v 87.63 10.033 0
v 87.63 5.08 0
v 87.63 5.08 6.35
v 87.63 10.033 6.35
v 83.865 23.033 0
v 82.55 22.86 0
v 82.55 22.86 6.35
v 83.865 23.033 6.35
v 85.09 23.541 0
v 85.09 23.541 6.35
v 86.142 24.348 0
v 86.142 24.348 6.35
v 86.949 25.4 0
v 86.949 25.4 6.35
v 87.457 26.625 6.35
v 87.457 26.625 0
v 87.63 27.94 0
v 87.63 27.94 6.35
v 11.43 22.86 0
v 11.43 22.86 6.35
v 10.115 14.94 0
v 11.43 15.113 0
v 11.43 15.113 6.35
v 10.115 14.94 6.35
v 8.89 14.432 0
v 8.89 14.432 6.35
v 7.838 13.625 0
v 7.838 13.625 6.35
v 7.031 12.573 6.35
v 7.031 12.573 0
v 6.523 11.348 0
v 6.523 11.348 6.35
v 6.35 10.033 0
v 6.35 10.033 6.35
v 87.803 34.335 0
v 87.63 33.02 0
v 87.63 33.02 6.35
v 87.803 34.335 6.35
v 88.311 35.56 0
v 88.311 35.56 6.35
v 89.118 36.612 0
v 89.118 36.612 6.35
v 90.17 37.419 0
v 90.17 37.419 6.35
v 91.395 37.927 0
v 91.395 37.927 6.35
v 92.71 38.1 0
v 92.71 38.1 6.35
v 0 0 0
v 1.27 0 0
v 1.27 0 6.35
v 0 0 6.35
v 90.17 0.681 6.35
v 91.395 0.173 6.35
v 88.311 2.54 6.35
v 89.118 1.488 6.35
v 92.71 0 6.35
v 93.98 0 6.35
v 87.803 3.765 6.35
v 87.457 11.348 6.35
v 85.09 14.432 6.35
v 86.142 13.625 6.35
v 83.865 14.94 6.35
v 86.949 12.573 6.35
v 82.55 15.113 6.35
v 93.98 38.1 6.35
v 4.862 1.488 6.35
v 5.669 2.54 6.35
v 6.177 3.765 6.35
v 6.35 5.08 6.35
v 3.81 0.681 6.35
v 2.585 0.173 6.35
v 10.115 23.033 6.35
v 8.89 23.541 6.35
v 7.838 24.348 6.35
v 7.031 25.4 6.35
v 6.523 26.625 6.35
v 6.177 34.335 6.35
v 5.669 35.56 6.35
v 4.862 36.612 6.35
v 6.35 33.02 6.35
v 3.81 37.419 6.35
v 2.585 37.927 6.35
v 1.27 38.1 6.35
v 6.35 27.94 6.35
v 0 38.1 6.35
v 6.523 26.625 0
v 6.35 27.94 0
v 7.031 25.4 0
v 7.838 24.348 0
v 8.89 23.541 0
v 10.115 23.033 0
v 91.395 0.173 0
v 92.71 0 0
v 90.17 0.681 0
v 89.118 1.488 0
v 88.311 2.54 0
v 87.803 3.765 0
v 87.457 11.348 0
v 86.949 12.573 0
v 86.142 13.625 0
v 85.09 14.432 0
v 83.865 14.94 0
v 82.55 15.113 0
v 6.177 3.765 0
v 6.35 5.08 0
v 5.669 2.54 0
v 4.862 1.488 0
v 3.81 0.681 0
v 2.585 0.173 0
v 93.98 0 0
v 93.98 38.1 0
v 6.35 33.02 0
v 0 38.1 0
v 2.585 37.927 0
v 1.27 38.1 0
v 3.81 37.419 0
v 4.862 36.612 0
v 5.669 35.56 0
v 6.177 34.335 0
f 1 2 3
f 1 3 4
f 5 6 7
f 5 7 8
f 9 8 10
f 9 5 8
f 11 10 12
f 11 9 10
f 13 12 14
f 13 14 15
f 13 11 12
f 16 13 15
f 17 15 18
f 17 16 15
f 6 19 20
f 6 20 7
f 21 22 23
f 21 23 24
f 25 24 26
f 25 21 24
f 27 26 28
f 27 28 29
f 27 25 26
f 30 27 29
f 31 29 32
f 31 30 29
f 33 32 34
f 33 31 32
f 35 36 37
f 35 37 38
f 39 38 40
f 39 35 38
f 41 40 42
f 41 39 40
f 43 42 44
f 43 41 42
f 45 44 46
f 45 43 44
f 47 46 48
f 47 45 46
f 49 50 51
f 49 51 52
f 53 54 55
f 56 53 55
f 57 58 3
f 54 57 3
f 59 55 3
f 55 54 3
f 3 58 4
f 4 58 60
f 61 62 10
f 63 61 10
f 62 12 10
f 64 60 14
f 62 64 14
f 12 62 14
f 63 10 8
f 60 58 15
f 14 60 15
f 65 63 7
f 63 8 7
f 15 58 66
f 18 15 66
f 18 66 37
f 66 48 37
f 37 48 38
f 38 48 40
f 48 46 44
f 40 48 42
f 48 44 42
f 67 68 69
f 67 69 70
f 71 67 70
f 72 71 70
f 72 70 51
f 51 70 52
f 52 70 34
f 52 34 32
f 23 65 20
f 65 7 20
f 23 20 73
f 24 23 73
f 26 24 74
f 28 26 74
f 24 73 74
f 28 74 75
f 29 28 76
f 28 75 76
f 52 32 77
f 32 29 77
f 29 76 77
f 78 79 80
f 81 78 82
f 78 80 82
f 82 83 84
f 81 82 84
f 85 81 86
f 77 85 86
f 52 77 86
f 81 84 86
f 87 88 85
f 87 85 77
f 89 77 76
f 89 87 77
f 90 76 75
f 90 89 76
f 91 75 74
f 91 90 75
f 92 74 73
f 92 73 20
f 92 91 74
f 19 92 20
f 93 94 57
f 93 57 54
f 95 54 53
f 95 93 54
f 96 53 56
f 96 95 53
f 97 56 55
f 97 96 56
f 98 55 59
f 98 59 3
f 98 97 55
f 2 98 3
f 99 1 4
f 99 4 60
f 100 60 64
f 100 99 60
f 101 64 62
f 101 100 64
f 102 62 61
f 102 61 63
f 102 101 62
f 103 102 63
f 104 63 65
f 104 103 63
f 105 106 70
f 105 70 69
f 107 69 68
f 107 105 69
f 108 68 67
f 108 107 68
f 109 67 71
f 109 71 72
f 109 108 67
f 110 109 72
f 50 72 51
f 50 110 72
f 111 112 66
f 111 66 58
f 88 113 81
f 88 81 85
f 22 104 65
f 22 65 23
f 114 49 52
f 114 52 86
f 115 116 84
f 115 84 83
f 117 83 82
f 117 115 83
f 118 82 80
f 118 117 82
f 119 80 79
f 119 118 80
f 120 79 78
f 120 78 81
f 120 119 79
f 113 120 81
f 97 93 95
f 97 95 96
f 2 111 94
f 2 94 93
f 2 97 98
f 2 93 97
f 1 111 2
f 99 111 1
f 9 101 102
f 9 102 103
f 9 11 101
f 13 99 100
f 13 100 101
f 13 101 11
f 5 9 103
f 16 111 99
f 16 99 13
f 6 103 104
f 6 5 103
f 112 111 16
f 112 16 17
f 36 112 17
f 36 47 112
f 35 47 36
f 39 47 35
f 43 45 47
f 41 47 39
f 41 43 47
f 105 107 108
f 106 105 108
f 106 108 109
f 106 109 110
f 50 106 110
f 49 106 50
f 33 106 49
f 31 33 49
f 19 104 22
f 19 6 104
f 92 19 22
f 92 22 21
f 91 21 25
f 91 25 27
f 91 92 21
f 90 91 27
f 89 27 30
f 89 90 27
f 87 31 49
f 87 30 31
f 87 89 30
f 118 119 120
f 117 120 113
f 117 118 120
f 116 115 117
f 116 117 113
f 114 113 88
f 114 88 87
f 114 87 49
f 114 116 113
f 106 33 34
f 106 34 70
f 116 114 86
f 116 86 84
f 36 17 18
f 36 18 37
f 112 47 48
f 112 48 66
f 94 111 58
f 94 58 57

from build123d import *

# Parameters (mm, degrees)
BOSS_EXTRUDE2_DEPTH = 6.35


with BuildPart() as part:
    # Sketch3 → Boss-Extrude2 (new body)
    with BuildSketch(Plane.XY):
        with BuildLine():
            Line((0, 0), (0, 38.1))
            Line((0, 38.1), (1.27, 38.1))
            ThreePointArc((1.27, 38.1), (4.862102448, 36.612102448), (6.35, 33.02))
            Line((6.35, 33.02), (6.35, 27.94))
            ThreePointArc((6.35, 27.94), (7.837897552, 24.347897552), (11.43, 22.86))
            Line((11.43, 22.86), (82.55, 22.86))
            ThreePointArc((82.55, 22.86), (86.142102448, 24.347897552), (87.63, 27.94))
            Line((87.63, 27.94), (87.63, 33.02))
            ThreePointArc((87.63, 33.02), (89.117897552, 36.612102448), (92.71, 38.1))
            Line((92.71, 38.1), (93.98, 38.1))
            Line((93.98, 38.1), (93.98, 0))
            Line((93.98, 0), (92.71, 0))
            ThreePointArc((92.71, 0), (89.117897552, 1.487897552), (87.63, 5.08))
            Line((87.63, 5.08), (87.63, 10.033))
            ThreePointArc((87.63, 10.033), (86.142102448, 13.625102448), (82.55, 15.113))
            Line((82.55, 15.113), (11.43, 15.113))
            ThreePointArc((11.43, 15.113), (7.837897552, 13.625102448), (6.35, 10.033))
            Line((6.35, 10.033), (6.35, 5.08))
            ThreePointArc((6.35, 5.08), (4.862102448, 1.487897552), (1.27, 0))
            Line((1.27, 0), (0, 0))
        make_face()
    extrude(amount=BOSS_EXTRUDE2_DEPTH)


solid = part.part
